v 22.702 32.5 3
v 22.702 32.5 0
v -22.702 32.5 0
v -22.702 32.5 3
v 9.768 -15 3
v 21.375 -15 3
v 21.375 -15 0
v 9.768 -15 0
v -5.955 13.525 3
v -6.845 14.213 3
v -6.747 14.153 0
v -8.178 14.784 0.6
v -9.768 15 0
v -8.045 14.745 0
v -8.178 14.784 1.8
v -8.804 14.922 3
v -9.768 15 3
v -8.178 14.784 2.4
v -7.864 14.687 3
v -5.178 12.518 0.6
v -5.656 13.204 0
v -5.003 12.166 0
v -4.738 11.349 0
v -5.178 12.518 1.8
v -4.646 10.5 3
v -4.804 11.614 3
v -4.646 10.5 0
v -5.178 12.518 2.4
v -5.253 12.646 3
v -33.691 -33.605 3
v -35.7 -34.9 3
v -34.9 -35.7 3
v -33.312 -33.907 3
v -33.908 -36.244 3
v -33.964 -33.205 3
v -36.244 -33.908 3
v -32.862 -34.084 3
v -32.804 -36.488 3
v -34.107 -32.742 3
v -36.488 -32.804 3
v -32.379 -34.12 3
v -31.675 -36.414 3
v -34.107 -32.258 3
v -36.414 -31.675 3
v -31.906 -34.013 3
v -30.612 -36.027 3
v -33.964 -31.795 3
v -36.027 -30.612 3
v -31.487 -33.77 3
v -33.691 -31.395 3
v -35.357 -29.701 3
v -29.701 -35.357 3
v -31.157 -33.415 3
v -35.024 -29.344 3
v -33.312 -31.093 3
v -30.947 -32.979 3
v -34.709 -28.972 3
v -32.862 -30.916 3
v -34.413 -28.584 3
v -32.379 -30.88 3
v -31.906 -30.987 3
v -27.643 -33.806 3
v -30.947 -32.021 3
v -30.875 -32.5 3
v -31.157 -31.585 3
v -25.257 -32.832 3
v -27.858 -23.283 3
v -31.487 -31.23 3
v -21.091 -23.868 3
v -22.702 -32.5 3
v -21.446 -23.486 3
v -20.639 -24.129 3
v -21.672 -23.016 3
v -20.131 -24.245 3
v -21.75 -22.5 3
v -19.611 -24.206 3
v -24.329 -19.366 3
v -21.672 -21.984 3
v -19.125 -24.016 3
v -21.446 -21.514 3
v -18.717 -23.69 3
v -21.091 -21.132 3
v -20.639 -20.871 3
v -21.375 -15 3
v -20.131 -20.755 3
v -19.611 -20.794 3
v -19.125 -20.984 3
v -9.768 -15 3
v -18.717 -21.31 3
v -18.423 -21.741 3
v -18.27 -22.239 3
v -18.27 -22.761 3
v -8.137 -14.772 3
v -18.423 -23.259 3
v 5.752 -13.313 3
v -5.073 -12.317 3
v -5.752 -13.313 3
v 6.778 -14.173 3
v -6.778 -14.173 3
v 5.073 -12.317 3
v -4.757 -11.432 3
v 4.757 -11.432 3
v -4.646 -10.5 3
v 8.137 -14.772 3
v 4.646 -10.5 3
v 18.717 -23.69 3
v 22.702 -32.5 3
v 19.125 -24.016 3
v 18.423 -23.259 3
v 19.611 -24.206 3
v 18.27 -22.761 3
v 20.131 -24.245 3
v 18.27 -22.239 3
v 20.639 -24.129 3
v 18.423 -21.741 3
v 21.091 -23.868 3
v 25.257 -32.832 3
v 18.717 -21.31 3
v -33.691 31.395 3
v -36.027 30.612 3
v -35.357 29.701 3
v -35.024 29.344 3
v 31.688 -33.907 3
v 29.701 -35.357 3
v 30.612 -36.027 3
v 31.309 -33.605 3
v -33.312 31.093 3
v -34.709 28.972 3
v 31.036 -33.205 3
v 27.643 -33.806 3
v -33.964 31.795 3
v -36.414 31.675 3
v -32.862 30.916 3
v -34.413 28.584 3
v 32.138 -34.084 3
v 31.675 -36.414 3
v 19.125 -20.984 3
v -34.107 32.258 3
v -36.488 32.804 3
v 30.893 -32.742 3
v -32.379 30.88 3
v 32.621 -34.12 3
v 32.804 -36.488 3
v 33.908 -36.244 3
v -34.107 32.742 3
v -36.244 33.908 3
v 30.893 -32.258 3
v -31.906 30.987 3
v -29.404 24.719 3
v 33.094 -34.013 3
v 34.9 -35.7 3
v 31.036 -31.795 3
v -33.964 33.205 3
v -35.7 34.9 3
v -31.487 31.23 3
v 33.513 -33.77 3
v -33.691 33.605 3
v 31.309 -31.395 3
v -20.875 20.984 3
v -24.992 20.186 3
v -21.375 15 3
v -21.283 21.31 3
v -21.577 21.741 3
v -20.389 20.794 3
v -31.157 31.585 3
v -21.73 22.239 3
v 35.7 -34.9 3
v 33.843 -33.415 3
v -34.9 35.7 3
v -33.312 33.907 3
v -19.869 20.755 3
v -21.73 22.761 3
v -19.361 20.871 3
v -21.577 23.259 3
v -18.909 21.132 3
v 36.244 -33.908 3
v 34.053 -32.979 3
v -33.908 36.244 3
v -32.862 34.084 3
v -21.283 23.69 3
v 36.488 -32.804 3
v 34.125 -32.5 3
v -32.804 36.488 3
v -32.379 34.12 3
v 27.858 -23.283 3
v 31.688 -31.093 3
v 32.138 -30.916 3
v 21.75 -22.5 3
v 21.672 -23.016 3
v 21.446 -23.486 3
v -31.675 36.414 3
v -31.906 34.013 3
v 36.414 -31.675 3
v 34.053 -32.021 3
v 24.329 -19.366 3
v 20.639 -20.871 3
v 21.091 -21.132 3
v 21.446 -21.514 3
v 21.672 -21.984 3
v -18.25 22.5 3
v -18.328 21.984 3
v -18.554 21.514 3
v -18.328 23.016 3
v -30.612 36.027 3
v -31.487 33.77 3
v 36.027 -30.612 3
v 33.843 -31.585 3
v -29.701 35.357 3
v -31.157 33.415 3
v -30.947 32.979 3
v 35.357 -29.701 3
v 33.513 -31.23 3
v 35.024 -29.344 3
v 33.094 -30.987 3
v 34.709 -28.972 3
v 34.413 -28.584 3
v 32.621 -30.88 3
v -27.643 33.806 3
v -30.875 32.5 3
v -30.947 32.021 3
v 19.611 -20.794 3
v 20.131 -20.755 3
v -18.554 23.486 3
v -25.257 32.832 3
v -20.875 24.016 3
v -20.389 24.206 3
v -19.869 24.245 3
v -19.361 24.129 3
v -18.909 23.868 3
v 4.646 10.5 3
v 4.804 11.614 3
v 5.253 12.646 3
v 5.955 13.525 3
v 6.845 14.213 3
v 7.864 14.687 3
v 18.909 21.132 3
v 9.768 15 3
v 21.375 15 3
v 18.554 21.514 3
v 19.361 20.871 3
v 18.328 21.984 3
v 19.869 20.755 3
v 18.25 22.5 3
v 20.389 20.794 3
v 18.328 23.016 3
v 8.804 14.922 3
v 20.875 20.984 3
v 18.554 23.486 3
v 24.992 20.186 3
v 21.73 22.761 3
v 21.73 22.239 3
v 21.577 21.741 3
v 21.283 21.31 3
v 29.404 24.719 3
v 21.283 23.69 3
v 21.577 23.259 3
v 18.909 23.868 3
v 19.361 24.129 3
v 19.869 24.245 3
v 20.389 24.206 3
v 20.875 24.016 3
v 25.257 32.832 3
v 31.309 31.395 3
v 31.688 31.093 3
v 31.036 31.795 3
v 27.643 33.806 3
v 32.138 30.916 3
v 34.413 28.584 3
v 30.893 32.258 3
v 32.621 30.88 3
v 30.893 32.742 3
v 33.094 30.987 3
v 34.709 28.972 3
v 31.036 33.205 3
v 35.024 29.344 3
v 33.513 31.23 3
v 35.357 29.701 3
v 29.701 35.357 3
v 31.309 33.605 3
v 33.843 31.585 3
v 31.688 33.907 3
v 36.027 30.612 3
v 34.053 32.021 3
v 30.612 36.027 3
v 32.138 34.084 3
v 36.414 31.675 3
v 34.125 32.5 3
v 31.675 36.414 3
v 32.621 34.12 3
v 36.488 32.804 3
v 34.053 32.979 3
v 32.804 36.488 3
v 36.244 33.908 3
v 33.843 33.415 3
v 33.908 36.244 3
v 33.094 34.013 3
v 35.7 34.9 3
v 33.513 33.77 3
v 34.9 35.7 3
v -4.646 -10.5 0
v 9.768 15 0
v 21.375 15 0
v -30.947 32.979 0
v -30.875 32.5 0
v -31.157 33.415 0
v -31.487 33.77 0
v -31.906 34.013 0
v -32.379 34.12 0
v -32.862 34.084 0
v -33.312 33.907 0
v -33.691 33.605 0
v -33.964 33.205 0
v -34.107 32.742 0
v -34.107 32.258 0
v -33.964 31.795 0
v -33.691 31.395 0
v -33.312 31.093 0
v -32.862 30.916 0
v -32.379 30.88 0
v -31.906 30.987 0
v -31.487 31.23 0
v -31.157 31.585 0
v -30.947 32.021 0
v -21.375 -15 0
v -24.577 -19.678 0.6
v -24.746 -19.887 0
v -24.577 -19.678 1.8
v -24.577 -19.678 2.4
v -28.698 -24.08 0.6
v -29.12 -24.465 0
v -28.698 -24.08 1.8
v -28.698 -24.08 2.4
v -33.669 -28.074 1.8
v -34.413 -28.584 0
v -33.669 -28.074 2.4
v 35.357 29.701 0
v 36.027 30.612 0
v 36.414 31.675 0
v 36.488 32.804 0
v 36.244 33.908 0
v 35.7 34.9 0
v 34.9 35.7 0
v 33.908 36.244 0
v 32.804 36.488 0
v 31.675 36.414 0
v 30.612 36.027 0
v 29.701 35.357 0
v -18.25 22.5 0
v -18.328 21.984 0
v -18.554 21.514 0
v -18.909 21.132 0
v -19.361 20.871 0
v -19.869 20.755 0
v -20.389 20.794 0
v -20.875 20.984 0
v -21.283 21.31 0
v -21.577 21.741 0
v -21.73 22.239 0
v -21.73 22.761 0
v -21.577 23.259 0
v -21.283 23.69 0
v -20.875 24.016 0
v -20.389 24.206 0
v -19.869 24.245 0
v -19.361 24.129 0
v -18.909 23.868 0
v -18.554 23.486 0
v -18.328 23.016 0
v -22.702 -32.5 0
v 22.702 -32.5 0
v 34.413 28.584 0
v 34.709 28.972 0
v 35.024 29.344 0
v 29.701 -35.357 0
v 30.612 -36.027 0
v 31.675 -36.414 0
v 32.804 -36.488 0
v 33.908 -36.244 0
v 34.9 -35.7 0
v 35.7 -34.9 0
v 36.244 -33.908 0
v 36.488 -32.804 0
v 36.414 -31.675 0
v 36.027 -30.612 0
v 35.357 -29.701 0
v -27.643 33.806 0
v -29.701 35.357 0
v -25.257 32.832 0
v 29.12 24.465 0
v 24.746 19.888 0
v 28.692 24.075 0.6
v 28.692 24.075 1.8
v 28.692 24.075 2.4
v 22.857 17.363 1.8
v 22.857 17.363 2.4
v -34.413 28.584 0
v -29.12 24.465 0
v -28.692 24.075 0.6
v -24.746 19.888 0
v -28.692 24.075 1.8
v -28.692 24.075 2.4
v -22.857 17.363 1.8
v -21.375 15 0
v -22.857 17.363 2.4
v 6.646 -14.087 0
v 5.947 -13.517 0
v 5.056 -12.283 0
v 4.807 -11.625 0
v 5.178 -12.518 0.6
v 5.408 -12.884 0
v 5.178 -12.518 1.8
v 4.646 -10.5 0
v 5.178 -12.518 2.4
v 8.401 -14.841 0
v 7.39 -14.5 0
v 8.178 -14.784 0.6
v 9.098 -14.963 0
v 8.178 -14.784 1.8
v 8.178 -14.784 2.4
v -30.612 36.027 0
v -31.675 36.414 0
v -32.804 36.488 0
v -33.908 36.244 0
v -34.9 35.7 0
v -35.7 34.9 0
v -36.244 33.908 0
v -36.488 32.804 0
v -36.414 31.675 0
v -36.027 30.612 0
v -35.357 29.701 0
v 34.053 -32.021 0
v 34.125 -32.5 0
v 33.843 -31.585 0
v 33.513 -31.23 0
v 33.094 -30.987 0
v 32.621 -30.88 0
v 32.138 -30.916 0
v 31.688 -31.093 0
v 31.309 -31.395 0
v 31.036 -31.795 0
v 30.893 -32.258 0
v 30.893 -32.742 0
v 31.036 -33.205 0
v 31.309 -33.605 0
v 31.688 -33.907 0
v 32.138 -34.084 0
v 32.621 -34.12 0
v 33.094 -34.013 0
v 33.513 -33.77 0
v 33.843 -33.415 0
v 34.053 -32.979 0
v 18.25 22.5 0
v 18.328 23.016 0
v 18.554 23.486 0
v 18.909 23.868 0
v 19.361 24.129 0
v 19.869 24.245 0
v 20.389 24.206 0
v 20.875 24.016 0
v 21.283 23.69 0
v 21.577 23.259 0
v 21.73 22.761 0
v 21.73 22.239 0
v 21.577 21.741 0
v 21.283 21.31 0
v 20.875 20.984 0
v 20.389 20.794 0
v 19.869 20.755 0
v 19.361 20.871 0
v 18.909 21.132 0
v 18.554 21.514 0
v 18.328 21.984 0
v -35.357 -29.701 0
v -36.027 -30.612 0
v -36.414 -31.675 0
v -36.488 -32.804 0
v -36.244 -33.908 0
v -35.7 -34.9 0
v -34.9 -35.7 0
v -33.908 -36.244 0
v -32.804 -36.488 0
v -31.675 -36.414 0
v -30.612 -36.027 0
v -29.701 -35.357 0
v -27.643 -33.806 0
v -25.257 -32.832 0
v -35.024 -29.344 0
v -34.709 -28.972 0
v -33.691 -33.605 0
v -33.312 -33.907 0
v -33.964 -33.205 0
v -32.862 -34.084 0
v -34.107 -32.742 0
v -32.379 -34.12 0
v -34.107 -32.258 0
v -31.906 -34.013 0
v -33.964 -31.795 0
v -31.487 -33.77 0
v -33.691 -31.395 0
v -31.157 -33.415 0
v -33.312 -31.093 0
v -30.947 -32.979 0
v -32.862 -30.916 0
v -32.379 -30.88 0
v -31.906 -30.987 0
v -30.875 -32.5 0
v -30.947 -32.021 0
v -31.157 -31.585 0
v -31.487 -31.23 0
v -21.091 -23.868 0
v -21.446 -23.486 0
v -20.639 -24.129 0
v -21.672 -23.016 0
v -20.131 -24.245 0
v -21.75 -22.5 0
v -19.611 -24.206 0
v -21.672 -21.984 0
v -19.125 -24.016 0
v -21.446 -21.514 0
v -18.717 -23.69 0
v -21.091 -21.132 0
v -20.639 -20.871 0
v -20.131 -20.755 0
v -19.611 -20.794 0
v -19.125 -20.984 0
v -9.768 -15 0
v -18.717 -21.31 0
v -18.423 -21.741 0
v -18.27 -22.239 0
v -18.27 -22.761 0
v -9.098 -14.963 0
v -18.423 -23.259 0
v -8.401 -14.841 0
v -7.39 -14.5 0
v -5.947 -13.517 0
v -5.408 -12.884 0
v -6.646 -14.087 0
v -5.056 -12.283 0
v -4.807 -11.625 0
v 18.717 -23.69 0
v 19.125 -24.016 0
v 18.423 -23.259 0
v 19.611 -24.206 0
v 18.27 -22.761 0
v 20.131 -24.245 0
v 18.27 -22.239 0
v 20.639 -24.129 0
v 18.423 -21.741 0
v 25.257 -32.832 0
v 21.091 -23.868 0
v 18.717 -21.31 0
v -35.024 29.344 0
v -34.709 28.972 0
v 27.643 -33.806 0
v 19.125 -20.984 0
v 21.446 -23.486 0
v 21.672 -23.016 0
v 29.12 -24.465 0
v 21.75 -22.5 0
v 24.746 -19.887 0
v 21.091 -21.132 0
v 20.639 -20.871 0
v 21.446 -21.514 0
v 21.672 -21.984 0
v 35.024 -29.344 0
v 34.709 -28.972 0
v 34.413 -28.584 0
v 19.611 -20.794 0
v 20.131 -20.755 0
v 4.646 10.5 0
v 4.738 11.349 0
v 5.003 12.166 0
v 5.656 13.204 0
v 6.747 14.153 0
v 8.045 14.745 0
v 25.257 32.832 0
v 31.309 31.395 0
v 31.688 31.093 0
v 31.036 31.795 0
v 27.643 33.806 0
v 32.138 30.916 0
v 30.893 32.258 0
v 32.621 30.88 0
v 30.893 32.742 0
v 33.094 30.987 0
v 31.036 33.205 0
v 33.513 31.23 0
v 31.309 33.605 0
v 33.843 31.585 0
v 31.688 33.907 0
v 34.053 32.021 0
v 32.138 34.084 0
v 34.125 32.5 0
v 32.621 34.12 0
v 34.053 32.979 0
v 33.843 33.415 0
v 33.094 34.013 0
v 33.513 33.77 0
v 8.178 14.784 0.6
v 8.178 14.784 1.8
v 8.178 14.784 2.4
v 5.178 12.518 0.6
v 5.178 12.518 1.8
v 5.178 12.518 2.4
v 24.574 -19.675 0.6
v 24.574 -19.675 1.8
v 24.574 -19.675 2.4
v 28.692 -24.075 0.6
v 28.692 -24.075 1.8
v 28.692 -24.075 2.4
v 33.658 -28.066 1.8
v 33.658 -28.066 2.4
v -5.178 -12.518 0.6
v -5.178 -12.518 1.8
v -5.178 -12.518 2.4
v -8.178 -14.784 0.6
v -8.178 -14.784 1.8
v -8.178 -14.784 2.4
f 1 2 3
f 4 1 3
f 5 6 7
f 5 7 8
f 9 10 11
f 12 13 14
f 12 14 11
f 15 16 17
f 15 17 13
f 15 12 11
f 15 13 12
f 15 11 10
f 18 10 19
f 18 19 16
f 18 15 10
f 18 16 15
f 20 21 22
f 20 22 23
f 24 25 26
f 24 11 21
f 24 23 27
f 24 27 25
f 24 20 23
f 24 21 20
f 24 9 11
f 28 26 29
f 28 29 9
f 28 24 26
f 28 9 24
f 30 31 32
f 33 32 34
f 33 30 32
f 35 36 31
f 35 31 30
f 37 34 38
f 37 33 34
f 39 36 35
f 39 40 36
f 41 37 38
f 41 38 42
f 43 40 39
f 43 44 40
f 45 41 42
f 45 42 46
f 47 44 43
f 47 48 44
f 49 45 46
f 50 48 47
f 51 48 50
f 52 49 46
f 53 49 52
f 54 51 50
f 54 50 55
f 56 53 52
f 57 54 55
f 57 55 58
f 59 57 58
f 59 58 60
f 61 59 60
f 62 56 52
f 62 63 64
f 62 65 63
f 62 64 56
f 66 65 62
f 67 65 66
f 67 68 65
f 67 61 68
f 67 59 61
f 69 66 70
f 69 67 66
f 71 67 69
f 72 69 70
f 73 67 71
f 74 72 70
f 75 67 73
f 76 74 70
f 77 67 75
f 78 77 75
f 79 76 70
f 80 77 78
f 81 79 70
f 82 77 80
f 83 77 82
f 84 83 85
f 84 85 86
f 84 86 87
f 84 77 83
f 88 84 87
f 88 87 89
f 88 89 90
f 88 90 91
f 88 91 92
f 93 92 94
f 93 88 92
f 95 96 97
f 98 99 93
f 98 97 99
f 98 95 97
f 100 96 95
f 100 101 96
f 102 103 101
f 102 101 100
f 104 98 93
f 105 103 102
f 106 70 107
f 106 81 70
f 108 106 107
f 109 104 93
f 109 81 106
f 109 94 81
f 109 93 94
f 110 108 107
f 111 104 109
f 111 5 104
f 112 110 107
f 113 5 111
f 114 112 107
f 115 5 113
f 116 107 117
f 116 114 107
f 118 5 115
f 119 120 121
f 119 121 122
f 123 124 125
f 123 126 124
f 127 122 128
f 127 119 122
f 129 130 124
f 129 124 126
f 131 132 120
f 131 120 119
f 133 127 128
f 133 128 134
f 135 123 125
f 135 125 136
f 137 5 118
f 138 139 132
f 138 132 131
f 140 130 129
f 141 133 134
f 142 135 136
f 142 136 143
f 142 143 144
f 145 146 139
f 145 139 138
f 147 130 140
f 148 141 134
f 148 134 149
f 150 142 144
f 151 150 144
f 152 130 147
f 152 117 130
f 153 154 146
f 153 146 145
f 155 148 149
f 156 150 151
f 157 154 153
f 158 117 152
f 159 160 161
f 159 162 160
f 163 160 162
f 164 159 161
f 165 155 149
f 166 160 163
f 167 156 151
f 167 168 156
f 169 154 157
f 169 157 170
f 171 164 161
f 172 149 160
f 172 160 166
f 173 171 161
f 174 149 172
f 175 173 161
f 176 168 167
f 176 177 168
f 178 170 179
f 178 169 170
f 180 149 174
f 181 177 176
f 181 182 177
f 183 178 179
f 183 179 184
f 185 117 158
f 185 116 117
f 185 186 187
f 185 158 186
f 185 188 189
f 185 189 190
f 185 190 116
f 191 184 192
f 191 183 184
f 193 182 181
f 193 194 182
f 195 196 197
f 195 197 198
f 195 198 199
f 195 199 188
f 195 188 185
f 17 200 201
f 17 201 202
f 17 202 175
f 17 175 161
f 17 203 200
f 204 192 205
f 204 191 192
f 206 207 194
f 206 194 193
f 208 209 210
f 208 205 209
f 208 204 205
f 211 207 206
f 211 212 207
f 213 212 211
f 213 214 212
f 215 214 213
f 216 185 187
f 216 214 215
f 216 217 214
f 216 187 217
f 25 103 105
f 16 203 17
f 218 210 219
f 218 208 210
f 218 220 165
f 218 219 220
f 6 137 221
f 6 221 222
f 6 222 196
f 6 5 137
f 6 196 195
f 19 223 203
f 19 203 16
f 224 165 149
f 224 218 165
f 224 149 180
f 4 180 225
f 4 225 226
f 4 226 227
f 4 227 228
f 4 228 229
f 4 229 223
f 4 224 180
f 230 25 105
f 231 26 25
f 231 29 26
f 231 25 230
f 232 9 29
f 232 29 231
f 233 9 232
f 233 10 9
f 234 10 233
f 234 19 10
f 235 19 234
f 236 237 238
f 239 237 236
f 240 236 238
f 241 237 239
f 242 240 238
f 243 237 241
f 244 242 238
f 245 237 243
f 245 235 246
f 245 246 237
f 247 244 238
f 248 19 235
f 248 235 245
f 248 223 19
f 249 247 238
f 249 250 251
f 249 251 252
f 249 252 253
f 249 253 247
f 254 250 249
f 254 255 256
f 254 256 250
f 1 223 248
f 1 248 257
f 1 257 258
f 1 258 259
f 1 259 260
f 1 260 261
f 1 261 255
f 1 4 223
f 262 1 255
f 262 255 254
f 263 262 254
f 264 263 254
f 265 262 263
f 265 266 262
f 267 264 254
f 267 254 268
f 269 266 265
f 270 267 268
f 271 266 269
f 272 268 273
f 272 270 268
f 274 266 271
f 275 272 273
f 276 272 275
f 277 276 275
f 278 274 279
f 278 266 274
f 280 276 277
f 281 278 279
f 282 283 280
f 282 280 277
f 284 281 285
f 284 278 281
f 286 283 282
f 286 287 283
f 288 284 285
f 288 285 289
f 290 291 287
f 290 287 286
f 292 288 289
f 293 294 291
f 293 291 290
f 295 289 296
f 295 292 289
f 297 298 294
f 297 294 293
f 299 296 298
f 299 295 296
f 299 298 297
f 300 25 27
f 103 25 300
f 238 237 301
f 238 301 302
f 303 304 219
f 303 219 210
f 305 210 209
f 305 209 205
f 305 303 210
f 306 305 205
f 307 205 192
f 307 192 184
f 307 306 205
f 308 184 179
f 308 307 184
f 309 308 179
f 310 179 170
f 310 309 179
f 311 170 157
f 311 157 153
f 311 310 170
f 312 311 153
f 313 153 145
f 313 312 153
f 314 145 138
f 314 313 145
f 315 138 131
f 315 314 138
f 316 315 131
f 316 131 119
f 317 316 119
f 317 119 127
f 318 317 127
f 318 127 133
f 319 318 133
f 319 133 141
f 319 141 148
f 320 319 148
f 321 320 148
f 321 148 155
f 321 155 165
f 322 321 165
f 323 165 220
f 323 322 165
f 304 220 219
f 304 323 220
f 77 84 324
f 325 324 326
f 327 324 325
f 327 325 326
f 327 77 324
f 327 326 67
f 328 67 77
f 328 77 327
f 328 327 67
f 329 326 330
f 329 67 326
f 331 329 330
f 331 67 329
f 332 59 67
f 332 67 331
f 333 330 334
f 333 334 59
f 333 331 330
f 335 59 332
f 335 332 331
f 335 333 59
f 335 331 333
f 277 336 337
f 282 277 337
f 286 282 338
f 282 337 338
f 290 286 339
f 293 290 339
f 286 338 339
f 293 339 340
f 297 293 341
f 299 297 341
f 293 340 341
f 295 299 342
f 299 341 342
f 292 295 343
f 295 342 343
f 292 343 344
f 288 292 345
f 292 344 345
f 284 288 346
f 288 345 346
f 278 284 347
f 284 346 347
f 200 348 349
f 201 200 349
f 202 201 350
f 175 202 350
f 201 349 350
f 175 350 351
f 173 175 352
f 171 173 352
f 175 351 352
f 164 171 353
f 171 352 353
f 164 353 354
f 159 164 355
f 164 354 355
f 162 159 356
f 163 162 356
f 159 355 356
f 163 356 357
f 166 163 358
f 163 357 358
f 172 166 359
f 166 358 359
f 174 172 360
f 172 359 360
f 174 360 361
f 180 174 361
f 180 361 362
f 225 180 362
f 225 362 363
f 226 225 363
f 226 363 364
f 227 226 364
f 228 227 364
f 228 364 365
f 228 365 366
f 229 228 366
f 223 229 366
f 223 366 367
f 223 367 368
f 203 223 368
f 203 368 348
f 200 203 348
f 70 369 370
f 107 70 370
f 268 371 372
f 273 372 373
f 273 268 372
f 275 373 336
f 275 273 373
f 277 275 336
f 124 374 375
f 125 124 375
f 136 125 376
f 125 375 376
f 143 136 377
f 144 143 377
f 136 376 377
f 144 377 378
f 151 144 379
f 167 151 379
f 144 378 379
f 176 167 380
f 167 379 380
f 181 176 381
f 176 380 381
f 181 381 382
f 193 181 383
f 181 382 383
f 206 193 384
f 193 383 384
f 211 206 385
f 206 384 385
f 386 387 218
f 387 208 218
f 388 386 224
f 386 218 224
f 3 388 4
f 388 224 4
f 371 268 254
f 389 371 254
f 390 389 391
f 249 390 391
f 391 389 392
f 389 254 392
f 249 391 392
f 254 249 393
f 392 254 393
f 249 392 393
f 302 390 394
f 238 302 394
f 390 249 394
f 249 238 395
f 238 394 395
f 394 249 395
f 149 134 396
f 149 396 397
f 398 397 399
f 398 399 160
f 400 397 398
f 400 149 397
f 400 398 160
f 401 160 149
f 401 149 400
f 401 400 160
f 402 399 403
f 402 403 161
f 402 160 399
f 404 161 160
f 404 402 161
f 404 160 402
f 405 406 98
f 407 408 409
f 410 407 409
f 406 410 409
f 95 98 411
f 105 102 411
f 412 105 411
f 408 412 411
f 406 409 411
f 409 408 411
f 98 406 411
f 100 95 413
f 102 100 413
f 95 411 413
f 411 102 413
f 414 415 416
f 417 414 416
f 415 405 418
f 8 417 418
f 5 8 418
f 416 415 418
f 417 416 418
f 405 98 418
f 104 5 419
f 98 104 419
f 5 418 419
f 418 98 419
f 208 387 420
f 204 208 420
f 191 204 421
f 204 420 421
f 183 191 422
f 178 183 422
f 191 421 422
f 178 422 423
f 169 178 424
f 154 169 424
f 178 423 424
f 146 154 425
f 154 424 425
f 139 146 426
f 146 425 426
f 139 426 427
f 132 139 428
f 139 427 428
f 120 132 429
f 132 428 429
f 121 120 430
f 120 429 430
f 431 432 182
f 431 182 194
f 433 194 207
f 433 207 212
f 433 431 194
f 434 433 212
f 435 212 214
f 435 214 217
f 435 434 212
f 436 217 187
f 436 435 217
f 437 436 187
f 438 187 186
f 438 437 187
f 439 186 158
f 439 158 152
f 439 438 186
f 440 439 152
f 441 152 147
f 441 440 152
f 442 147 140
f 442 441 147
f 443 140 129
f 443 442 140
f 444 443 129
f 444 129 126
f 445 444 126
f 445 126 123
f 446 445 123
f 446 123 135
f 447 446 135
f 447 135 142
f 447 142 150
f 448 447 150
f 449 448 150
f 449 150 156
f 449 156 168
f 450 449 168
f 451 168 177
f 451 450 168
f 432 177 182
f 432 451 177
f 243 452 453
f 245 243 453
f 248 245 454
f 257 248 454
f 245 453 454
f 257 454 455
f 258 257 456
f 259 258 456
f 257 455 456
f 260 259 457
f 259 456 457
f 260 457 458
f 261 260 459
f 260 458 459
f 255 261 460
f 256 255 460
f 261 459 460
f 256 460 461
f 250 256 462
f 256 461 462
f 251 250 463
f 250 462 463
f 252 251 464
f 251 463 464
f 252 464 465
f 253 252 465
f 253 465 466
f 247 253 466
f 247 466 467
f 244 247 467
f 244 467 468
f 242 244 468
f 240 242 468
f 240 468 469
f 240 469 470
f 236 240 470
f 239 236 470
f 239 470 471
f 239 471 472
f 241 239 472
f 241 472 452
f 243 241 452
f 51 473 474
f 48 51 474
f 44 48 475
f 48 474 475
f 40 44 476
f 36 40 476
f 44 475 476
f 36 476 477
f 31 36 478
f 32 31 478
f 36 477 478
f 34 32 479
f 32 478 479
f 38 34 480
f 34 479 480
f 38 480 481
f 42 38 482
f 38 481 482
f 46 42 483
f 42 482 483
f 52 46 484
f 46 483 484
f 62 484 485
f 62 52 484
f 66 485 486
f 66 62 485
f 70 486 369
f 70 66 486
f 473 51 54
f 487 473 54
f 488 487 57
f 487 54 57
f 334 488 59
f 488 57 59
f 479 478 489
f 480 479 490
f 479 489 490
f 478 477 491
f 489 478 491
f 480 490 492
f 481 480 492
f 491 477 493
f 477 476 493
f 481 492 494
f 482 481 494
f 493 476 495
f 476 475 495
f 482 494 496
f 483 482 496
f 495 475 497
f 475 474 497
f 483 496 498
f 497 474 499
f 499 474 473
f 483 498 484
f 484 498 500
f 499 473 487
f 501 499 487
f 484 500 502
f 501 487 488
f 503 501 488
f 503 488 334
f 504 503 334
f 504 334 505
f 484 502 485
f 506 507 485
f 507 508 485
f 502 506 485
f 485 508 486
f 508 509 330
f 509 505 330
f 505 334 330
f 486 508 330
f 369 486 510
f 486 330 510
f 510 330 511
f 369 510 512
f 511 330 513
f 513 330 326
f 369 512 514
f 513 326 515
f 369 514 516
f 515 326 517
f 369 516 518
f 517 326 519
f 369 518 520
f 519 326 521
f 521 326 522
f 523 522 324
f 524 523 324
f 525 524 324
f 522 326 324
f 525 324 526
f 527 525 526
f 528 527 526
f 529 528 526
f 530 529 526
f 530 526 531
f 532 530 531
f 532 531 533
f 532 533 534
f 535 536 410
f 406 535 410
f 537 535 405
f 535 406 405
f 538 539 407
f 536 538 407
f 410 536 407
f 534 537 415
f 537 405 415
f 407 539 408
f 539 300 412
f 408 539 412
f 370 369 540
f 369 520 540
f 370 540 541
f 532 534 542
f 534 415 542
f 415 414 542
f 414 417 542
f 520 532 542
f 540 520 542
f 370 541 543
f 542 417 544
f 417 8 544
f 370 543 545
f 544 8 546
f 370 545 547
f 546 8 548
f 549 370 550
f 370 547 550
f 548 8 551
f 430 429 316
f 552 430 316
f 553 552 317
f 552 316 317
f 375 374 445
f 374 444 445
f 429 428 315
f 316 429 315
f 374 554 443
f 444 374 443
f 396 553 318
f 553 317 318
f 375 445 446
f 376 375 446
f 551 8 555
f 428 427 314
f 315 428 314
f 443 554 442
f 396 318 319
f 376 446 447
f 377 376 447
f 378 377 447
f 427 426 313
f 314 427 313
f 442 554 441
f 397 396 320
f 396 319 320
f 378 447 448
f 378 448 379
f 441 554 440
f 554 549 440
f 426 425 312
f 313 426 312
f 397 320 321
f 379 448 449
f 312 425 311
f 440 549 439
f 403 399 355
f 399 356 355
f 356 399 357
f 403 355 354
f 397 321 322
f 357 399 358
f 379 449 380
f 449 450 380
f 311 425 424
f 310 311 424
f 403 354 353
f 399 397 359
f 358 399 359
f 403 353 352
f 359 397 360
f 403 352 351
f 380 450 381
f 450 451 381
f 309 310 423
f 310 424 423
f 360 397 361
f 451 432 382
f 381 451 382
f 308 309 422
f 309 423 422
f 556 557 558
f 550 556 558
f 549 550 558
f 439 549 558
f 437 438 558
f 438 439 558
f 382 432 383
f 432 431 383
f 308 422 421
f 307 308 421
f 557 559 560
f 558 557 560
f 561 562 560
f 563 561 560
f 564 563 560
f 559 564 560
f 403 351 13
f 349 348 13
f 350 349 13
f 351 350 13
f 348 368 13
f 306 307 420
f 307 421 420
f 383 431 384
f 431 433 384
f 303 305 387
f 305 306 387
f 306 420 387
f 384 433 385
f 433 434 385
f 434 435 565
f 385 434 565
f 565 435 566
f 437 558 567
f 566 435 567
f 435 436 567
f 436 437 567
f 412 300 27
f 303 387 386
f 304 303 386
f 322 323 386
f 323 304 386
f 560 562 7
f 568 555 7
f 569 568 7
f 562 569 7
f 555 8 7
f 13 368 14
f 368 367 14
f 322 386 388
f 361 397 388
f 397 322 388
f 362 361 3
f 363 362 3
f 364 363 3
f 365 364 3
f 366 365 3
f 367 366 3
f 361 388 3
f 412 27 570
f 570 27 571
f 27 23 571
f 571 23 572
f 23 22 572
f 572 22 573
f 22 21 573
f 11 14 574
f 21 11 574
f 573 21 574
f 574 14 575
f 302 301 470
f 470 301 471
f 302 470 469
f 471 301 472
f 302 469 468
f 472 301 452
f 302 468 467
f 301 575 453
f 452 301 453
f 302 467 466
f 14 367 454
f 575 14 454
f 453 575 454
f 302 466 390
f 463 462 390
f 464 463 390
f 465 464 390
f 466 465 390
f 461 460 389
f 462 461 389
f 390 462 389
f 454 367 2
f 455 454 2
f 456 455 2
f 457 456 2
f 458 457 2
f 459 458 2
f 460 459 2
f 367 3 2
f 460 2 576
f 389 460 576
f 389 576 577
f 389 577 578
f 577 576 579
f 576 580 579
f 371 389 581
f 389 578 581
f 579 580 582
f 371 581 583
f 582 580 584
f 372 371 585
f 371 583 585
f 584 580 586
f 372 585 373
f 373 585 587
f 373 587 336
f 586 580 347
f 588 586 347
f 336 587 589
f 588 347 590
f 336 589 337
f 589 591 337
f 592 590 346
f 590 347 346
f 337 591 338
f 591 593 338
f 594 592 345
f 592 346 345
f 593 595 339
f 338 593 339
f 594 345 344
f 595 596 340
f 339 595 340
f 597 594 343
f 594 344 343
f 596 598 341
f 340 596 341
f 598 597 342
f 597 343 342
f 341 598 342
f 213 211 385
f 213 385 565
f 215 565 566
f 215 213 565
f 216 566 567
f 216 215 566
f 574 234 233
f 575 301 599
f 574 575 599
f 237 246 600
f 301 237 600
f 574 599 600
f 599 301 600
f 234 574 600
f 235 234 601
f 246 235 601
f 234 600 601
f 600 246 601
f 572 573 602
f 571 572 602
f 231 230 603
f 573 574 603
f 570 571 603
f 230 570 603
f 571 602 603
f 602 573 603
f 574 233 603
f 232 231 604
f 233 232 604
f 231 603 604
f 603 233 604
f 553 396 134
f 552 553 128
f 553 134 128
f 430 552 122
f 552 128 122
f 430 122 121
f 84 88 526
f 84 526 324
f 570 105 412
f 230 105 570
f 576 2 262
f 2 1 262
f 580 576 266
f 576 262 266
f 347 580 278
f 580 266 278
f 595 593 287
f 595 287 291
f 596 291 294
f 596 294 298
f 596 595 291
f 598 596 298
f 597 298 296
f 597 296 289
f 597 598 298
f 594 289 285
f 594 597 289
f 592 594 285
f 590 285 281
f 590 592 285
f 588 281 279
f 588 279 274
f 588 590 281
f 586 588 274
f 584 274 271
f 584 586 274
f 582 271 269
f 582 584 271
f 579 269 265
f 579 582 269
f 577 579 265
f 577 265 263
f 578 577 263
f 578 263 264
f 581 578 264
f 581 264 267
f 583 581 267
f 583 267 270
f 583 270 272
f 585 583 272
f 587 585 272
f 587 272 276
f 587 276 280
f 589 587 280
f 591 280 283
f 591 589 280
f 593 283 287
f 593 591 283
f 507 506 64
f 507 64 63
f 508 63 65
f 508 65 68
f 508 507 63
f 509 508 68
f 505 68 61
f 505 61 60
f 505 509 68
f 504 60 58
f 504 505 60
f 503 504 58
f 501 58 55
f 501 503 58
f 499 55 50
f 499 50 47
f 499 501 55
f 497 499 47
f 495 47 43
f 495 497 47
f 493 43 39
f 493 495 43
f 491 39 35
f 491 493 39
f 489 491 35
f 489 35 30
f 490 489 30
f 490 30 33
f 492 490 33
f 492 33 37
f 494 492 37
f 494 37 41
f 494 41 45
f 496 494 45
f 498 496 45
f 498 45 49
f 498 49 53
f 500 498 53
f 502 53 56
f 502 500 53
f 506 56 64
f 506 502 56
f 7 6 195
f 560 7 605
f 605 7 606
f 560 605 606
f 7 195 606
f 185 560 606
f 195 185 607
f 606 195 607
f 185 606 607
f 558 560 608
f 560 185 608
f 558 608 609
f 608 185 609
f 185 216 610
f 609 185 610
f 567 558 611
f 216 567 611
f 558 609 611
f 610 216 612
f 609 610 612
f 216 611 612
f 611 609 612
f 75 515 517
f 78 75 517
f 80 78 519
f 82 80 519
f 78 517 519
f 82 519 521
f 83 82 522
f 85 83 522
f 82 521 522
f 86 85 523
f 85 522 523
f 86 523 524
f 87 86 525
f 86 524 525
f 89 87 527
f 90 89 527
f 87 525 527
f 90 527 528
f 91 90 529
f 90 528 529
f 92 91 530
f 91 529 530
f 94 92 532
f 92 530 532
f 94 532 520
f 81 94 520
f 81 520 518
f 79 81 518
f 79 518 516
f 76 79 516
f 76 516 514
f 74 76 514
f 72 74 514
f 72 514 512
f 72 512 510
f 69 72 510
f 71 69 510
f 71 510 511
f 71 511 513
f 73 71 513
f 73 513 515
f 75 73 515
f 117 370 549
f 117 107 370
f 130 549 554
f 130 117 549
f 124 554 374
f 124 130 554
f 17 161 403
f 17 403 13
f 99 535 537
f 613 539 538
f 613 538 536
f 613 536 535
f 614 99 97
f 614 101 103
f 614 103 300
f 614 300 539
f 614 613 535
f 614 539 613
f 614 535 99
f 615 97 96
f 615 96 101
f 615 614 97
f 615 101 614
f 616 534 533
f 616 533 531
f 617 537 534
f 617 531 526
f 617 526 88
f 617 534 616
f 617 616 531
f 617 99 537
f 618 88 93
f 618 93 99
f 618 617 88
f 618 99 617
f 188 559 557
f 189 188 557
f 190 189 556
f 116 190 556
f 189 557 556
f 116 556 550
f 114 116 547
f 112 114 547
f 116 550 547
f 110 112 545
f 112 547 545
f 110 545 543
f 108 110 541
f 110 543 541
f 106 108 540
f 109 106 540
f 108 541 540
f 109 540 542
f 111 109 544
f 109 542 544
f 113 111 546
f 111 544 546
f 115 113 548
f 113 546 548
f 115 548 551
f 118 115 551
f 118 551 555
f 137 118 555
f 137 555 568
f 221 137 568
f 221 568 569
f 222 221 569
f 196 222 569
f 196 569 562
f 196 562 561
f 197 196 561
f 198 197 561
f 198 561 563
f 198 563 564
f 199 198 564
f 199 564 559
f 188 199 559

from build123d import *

# Parameters (mm, degrees)
SKETCH_1_R          = 1.625
EXTRUDE_1_DEPTH     = 3
FILLET_1_R          = 10
SKETCH_2_R          = 1.75
CUT_EXTRUDE_1_DEPTH = 10
CUT_EXTRUDE_START   = -10
CUT_EXTRUDE_2_DEPTH = 10


with BuildPart() as part:
    # Эскиз1 → Бобышка-Вытянуть1 (new body)
    with BuildSketch(Plane.XY):
        with BuildLine():
            ThreePointArc((-32.5, -28.5), (-35.328427125, -35.328427125), (-28.5, -32.5))
            Line((-28.5, -32.5), (28.5, -32.5))
            ThreePointArc((28.5, -32.5), (35.328427125, -35.328427125), (32.5, -28.5))
            Line((32.5, -28.5), (32.5, 28.5))
            ThreePointArc((32.5, 28.5), (35.328427125, 35.328427125), (28.5, 32.5))
            Line((28.5, 32.5), (-28.5, 32.5))
            ThreePointArc((-28.5, 32.5), (-35.328427125, 35.328427125), (-32.5, 28.5))
            Line((-32.5, 28.5), (-32.5, -28.5))
        make_face()
        with Locations((-32.5, -32.5)):
            Circle(SKETCH_1_R, mode=Mode.SUBTRACT)
        with Locations((32.5, 32.5)):
            Circle(SKETCH_1_R, mode=Mode.SUBTRACT)
        with Locations((-32.5, 32.5)):
            Circle(SKETCH_1_R, mode=Mode.SUBTRACT)
        with Locations((32.5, -32.5)):
            Circle(SKETCH_1_R, mode=Mode.SUBTRACT)
    extrude(amount=EXTRUDE_1_DEPTH)

    # Скругление1
    fillet_1_edges = [part.edges().sort_by_distance(p)[0] for p in [
        (-32.5, -28.5, 1.5),
        (-32.5, 28.5, 1.5),
        (-28.5, 32.5, 1.5),
        (28.5, 32.5, 1.5),
        (32.5, 28.5, 1.5),
        (32.5, -28.5, 1.5),
        (28.5, -32.5, 1.5),
        (-28.5, -32.5, 1.5),
    ]]
    fillet(fillet_1_edges, radius=FILLET_1_R)

    # Эскиз2 → Вырез-Вытянуть1 (cut)
    with BuildSketch(Plane(origin=(0, 0, 0), x_dir=(-1, 0, 0), z_dir=(0, 0, -1))):
        with Locations((-20, 22.5)):
            Circle(SKETCH_2_R)
        with Locations(Location((20, 22.5, 0), (0, 0, 180))):
            Circle(SKETCH_2_R)
        with Locations((20, -22.5)):
            Circle(SKETCH_2_R)
        with Locations(Location((-20, -22.5, 0), (0, 0, 180))):
            Circle(SKETCH_2_R)
    extrude(amount=-CUT_EXTRUDE_1_DEPTH, mode=Mode.SUBTRACT)

    # Эскиз3 → Вырез-Вытянуть2 (cut)
    with BuildSketch(Plane(origin=(0, 0, 0), x_dir=(-1, 0, 0), z_dir=(0, 0, -1)).offset(CUT_EXTRUDE_START)):
        with BuildLine():
            ThreePointArc((-32.527489622, -23.443011177), (-33.111487572, -26.145271254), (-34.41307423, -28.584356184))
            add(Edge.make_bspline(
                [(-21.375247121, -15), (-21.837243406, -15.807037469), (-22.815077284, -17.366302748), (-25.110100773, -20.461656809), (-28.548566388, -24.142111027), (-32.105145522, -27.003843019), (-34.159091146, -28.413411533), (-34.41307423, -28.584356184)],
                knots=[0.041506699, 0.041506699, 0.041506699, 0.041506699, 0.10141253, 0.161318362, 0.281130024, 0.400941687, 0.417671357, 0.417671357, 0.417671357, 0.417671357], degree=3))
            Line((-21.375247121, -15), (-9.767766953, -15))
            add(Edge.make_bspline(
                [(-4.646446609, -10.5), (-4.646446609, -11.195491949), (-5.02770668, -12.620388587), (-6.499735229, -14.141611525), (-7.906330267, -14.751989256), (-9.003254917, -14.968962036), (-9.508808337, -15), (-9.767766953, -15)],
                knots=[0, 0, 0, 0, 0.25, 0.5, 0.75, 0.875, 1, 1, 1, 1], degree=3))
            Line((-4.646446609, -10.5), (-4.646446609, 10.5))
            add(Edge.make_bspline(
                [(-9.767766953, 15), (-9.508808337, 15), (-9.003254917, 14.968962036), (-7.906330267, 14.751989256), (-6.499735229, 14.141611525), (-5.02770668, 12.620388587), (-4.646446609, 11.195491949), (-4.646446609, 10.5)],
                knots=[0, 0, 0, 0, 0.125, 0.25, 0.5, 0.75, 1, 1, 1, 1], degree=3))
            Line((-9.767766953, 15), (-21.375246423, 15))
            add(Edge.make_bspline(
                [(-34.413080182, 28.584364367), (-34.159090219, 28.413415142), (-32.105139192, 27.003842637), (-28.548557361, 24.142106491), (-25.110095557, 20.461653929), (-22.815074777, 17.366301448), (-21.837242114, 15.807037015), (-21.375246423, 15)],
                knots=[0.582328153, 0.582328153, 0.582328153, 0.582328153, 0.599058284, 0.718869941, 0.838681597, 0.898587426, 0.958493254, 0.958493254, 0.958493254, 0.958493254], degree=3))
            ThreePointArc((-34.413080182, 28.584364367), (-33.111490075, 26.145278078), (-32.52748995, 23.443015585))
            add(Edge.make_bspline(
                [(-32.52748995, 23.443015585), (-28.375728659, 20.01802535), (-25.24455418, 16.149809293), (-23.169847522, 12)],
                knots=[0.670058199, 0.670058199, 0.670058199, 0.670058199, 1, 1, 1, 1], degree=3, weights=[0.931160567, 0.942808023, 0.965754501, 1]))
            Line((-23.169847522, 12), (-9.767766953, 12))
            add(Edge.make_bspline(
                [(-9.767766953, 12), (-8.525126266, 12), (-7.646446609, 11.378679656), (-7.646446609, 10.5)],
                knots=[0, 0, 0, 0, 1, 1, 1, 1], degree=3, weights=[1, 0.804737854, 0.804737854, 1]))
            Line((-7.646446609, 10.5), (-7.646446609, -10.5))
            add(Edge.make_bspline(
                [(-7.646446609, -10.5), (-7.646446609, -11.378679656), (-8.525126266, -12), (-9.767766953, -12)],
                knots=[0, 0, 0, 0, 1, 1, 1, 1], degree=3, weights=[1, 0.804737854, 0.804737854, 1]))
            Line((-9.767766953, -12), (-23.169847522, -12))
            add(Edge.make_bspline(
                [(-23.169847522, -12), (-25.244555327, -16.149807692), (-28.375729667, -20.018022166), (-32.527489622, -23.443011177)],
                knots=[0, 0, 0, 0, 0.329941488, 0.329941488, 0.329941488, 0.329941488], degree=3, weights=[1, 0.965754533, 0.942808067, 0.9311606]))
        make_face()
        with BuildLine():
            ThreePointArc((34.413079829, -28.584363881), (33.111489843, -26.145277446), (32.527489894, -23.443014841))
            add(Edge.make_bspline(
                [(32.527489894, -23.443014841), (28.375728829, -20.018024812), (25.244554374, -16.149809022), (23.169847522, -12)],
                knots=[0.670058252, 0.670058252, 0.670058252, 0.670058252, 1, 1, 1, 1], degree=3, weights=[0.931160573, 0.942808031, 0.965754506, 1]))
            Line((23.169847522, -12), (9.767766953, -12))
            add(Edge.make_bspline(
                [(9.767766953, -12), (8.525126266, -12), (7.646446609, -11.378679656), (7.646446609, -10.5)],
                knots=[0, 0, 0, 0, 1, 1, 1, 1], degree=3, weights=[1, 0.804737854, 0.804737854, 1]))
            Line((7.646446609, -10.5), (7.646446609, 10.5))
            add(Edge.make_bspline(
                [(7.646446609, 10.5), (7.646446609, 11.378679656), (8.525126266, 12), (9.767766953, 12)],
                knots=[0, 0, 0, 0, 1, 1, 1, 1], degree=3, weights=[1, 0.804737854, 0.804737854, 1]))
            Line((9.767766953, 12), (23.169847522, 12))
            add(Edge.make_bspline(
                [(23.169847522, 12), (25.244551608, 16.149812881), (28.375726398, 20.018032487), (32.527490684, 23.443025466)],
                knots=[0, 0, 0, 0, 0.329942503, 0.329942503, 0.329942503, 0.329942503], degree=3, weights=[1, 0.965754428, 0.942807926, 0.931160493]))
            ThreePointArc((32.527490684, 23.443025466), (33.111495685, 26.145293377), (34.413093524, 28.58438271))
            add(Edge.make_bspline(
                [(34.413093524, 28.58438271), (34.15908814, 28.413423233), (32.105125, 27.003841781), (28.548537123, 24.142096322), (25.110083863, 20.461647473), (22.815069156, 17.366298535), (21.837239216, 15.807035997), (21.37524486, 15)],
                knots=[0.623833905, 0.623833905, 0.623833905, 0.623833905, 0.640565069, 0.760376713, 0.880188356, 0.940094178, 1, 1, 1, 1], degree=3))
            Line((21.37524486, 15), (9.767766953, 15))
            add(Edge.make_bspline(
                [(9.767766953, 15), (9.508808337, 15), (9.003254917, 14.968962036), (7.906330267, 14.751989256), (6.499735229, 14.141611525), (5.02770668, 12.620388587), (4.646446609, 11.195491949), (4.646446609, 10.5)],
                knots=[0, 0, 0, 0, 0.125, 0.25, 0.5, 0.75, 1, 1, 1, 1], degree=3))
            Line((4.646446609, 10.5), (4.646446609, -10.5))
            add(Edge.make_bspline(
                [(4.646446609, -10.5), (4.646446609, -11.195491949), (5.02770668, -12.620388587), (6.499735229, -14.141611525), (7.906330267, -14.751989256), (9.003254917, -14.968962036), (9.508808337, -15), (9.767766953, -15)],
                knots=[0, 0, 0, 0, 0.25, 0.5, 0.75, 0.875, 1, 1, 1, 1], degree=3))
            Line((9.767766953, -15), (21.375246541, -15))
            add(Edge.make_bspline(
                [(21.375246541, -15), (21.837559693, -15.807591474), (22.816100456, -17.367890887), (25.112994349, -20.465265714), (28.554552568, -24.147931842), (32.110993648, -27.008206413), (34.162781762, -28.415899337), (34.413079829, -28.584363881)],
                knots=[-0.000648378, -0.000648378, -0.000648378, -0.000648378, 0.059297975, 0.119244327, 0.239137032, 0.359029737, 0.375516672, 0.375516672, 0.375516672, 0.375516672], degree=3))
        make_face()
    extrude(amount=CUT_EXTRUDE_2_DEPTH, mode=Mode.SUBTRACT)


with BuildPart() as cut_extrude_2_kept_piece:
    # of the separate pieces the step leaves, the one the design keeps (cut_extrude_2_pieces_kept)
    add(part.part.solids().sort_by_distance((-34.413093524, 28.58438271, 0))[0])


solid = cut_extrude_2_kept_piece.part
